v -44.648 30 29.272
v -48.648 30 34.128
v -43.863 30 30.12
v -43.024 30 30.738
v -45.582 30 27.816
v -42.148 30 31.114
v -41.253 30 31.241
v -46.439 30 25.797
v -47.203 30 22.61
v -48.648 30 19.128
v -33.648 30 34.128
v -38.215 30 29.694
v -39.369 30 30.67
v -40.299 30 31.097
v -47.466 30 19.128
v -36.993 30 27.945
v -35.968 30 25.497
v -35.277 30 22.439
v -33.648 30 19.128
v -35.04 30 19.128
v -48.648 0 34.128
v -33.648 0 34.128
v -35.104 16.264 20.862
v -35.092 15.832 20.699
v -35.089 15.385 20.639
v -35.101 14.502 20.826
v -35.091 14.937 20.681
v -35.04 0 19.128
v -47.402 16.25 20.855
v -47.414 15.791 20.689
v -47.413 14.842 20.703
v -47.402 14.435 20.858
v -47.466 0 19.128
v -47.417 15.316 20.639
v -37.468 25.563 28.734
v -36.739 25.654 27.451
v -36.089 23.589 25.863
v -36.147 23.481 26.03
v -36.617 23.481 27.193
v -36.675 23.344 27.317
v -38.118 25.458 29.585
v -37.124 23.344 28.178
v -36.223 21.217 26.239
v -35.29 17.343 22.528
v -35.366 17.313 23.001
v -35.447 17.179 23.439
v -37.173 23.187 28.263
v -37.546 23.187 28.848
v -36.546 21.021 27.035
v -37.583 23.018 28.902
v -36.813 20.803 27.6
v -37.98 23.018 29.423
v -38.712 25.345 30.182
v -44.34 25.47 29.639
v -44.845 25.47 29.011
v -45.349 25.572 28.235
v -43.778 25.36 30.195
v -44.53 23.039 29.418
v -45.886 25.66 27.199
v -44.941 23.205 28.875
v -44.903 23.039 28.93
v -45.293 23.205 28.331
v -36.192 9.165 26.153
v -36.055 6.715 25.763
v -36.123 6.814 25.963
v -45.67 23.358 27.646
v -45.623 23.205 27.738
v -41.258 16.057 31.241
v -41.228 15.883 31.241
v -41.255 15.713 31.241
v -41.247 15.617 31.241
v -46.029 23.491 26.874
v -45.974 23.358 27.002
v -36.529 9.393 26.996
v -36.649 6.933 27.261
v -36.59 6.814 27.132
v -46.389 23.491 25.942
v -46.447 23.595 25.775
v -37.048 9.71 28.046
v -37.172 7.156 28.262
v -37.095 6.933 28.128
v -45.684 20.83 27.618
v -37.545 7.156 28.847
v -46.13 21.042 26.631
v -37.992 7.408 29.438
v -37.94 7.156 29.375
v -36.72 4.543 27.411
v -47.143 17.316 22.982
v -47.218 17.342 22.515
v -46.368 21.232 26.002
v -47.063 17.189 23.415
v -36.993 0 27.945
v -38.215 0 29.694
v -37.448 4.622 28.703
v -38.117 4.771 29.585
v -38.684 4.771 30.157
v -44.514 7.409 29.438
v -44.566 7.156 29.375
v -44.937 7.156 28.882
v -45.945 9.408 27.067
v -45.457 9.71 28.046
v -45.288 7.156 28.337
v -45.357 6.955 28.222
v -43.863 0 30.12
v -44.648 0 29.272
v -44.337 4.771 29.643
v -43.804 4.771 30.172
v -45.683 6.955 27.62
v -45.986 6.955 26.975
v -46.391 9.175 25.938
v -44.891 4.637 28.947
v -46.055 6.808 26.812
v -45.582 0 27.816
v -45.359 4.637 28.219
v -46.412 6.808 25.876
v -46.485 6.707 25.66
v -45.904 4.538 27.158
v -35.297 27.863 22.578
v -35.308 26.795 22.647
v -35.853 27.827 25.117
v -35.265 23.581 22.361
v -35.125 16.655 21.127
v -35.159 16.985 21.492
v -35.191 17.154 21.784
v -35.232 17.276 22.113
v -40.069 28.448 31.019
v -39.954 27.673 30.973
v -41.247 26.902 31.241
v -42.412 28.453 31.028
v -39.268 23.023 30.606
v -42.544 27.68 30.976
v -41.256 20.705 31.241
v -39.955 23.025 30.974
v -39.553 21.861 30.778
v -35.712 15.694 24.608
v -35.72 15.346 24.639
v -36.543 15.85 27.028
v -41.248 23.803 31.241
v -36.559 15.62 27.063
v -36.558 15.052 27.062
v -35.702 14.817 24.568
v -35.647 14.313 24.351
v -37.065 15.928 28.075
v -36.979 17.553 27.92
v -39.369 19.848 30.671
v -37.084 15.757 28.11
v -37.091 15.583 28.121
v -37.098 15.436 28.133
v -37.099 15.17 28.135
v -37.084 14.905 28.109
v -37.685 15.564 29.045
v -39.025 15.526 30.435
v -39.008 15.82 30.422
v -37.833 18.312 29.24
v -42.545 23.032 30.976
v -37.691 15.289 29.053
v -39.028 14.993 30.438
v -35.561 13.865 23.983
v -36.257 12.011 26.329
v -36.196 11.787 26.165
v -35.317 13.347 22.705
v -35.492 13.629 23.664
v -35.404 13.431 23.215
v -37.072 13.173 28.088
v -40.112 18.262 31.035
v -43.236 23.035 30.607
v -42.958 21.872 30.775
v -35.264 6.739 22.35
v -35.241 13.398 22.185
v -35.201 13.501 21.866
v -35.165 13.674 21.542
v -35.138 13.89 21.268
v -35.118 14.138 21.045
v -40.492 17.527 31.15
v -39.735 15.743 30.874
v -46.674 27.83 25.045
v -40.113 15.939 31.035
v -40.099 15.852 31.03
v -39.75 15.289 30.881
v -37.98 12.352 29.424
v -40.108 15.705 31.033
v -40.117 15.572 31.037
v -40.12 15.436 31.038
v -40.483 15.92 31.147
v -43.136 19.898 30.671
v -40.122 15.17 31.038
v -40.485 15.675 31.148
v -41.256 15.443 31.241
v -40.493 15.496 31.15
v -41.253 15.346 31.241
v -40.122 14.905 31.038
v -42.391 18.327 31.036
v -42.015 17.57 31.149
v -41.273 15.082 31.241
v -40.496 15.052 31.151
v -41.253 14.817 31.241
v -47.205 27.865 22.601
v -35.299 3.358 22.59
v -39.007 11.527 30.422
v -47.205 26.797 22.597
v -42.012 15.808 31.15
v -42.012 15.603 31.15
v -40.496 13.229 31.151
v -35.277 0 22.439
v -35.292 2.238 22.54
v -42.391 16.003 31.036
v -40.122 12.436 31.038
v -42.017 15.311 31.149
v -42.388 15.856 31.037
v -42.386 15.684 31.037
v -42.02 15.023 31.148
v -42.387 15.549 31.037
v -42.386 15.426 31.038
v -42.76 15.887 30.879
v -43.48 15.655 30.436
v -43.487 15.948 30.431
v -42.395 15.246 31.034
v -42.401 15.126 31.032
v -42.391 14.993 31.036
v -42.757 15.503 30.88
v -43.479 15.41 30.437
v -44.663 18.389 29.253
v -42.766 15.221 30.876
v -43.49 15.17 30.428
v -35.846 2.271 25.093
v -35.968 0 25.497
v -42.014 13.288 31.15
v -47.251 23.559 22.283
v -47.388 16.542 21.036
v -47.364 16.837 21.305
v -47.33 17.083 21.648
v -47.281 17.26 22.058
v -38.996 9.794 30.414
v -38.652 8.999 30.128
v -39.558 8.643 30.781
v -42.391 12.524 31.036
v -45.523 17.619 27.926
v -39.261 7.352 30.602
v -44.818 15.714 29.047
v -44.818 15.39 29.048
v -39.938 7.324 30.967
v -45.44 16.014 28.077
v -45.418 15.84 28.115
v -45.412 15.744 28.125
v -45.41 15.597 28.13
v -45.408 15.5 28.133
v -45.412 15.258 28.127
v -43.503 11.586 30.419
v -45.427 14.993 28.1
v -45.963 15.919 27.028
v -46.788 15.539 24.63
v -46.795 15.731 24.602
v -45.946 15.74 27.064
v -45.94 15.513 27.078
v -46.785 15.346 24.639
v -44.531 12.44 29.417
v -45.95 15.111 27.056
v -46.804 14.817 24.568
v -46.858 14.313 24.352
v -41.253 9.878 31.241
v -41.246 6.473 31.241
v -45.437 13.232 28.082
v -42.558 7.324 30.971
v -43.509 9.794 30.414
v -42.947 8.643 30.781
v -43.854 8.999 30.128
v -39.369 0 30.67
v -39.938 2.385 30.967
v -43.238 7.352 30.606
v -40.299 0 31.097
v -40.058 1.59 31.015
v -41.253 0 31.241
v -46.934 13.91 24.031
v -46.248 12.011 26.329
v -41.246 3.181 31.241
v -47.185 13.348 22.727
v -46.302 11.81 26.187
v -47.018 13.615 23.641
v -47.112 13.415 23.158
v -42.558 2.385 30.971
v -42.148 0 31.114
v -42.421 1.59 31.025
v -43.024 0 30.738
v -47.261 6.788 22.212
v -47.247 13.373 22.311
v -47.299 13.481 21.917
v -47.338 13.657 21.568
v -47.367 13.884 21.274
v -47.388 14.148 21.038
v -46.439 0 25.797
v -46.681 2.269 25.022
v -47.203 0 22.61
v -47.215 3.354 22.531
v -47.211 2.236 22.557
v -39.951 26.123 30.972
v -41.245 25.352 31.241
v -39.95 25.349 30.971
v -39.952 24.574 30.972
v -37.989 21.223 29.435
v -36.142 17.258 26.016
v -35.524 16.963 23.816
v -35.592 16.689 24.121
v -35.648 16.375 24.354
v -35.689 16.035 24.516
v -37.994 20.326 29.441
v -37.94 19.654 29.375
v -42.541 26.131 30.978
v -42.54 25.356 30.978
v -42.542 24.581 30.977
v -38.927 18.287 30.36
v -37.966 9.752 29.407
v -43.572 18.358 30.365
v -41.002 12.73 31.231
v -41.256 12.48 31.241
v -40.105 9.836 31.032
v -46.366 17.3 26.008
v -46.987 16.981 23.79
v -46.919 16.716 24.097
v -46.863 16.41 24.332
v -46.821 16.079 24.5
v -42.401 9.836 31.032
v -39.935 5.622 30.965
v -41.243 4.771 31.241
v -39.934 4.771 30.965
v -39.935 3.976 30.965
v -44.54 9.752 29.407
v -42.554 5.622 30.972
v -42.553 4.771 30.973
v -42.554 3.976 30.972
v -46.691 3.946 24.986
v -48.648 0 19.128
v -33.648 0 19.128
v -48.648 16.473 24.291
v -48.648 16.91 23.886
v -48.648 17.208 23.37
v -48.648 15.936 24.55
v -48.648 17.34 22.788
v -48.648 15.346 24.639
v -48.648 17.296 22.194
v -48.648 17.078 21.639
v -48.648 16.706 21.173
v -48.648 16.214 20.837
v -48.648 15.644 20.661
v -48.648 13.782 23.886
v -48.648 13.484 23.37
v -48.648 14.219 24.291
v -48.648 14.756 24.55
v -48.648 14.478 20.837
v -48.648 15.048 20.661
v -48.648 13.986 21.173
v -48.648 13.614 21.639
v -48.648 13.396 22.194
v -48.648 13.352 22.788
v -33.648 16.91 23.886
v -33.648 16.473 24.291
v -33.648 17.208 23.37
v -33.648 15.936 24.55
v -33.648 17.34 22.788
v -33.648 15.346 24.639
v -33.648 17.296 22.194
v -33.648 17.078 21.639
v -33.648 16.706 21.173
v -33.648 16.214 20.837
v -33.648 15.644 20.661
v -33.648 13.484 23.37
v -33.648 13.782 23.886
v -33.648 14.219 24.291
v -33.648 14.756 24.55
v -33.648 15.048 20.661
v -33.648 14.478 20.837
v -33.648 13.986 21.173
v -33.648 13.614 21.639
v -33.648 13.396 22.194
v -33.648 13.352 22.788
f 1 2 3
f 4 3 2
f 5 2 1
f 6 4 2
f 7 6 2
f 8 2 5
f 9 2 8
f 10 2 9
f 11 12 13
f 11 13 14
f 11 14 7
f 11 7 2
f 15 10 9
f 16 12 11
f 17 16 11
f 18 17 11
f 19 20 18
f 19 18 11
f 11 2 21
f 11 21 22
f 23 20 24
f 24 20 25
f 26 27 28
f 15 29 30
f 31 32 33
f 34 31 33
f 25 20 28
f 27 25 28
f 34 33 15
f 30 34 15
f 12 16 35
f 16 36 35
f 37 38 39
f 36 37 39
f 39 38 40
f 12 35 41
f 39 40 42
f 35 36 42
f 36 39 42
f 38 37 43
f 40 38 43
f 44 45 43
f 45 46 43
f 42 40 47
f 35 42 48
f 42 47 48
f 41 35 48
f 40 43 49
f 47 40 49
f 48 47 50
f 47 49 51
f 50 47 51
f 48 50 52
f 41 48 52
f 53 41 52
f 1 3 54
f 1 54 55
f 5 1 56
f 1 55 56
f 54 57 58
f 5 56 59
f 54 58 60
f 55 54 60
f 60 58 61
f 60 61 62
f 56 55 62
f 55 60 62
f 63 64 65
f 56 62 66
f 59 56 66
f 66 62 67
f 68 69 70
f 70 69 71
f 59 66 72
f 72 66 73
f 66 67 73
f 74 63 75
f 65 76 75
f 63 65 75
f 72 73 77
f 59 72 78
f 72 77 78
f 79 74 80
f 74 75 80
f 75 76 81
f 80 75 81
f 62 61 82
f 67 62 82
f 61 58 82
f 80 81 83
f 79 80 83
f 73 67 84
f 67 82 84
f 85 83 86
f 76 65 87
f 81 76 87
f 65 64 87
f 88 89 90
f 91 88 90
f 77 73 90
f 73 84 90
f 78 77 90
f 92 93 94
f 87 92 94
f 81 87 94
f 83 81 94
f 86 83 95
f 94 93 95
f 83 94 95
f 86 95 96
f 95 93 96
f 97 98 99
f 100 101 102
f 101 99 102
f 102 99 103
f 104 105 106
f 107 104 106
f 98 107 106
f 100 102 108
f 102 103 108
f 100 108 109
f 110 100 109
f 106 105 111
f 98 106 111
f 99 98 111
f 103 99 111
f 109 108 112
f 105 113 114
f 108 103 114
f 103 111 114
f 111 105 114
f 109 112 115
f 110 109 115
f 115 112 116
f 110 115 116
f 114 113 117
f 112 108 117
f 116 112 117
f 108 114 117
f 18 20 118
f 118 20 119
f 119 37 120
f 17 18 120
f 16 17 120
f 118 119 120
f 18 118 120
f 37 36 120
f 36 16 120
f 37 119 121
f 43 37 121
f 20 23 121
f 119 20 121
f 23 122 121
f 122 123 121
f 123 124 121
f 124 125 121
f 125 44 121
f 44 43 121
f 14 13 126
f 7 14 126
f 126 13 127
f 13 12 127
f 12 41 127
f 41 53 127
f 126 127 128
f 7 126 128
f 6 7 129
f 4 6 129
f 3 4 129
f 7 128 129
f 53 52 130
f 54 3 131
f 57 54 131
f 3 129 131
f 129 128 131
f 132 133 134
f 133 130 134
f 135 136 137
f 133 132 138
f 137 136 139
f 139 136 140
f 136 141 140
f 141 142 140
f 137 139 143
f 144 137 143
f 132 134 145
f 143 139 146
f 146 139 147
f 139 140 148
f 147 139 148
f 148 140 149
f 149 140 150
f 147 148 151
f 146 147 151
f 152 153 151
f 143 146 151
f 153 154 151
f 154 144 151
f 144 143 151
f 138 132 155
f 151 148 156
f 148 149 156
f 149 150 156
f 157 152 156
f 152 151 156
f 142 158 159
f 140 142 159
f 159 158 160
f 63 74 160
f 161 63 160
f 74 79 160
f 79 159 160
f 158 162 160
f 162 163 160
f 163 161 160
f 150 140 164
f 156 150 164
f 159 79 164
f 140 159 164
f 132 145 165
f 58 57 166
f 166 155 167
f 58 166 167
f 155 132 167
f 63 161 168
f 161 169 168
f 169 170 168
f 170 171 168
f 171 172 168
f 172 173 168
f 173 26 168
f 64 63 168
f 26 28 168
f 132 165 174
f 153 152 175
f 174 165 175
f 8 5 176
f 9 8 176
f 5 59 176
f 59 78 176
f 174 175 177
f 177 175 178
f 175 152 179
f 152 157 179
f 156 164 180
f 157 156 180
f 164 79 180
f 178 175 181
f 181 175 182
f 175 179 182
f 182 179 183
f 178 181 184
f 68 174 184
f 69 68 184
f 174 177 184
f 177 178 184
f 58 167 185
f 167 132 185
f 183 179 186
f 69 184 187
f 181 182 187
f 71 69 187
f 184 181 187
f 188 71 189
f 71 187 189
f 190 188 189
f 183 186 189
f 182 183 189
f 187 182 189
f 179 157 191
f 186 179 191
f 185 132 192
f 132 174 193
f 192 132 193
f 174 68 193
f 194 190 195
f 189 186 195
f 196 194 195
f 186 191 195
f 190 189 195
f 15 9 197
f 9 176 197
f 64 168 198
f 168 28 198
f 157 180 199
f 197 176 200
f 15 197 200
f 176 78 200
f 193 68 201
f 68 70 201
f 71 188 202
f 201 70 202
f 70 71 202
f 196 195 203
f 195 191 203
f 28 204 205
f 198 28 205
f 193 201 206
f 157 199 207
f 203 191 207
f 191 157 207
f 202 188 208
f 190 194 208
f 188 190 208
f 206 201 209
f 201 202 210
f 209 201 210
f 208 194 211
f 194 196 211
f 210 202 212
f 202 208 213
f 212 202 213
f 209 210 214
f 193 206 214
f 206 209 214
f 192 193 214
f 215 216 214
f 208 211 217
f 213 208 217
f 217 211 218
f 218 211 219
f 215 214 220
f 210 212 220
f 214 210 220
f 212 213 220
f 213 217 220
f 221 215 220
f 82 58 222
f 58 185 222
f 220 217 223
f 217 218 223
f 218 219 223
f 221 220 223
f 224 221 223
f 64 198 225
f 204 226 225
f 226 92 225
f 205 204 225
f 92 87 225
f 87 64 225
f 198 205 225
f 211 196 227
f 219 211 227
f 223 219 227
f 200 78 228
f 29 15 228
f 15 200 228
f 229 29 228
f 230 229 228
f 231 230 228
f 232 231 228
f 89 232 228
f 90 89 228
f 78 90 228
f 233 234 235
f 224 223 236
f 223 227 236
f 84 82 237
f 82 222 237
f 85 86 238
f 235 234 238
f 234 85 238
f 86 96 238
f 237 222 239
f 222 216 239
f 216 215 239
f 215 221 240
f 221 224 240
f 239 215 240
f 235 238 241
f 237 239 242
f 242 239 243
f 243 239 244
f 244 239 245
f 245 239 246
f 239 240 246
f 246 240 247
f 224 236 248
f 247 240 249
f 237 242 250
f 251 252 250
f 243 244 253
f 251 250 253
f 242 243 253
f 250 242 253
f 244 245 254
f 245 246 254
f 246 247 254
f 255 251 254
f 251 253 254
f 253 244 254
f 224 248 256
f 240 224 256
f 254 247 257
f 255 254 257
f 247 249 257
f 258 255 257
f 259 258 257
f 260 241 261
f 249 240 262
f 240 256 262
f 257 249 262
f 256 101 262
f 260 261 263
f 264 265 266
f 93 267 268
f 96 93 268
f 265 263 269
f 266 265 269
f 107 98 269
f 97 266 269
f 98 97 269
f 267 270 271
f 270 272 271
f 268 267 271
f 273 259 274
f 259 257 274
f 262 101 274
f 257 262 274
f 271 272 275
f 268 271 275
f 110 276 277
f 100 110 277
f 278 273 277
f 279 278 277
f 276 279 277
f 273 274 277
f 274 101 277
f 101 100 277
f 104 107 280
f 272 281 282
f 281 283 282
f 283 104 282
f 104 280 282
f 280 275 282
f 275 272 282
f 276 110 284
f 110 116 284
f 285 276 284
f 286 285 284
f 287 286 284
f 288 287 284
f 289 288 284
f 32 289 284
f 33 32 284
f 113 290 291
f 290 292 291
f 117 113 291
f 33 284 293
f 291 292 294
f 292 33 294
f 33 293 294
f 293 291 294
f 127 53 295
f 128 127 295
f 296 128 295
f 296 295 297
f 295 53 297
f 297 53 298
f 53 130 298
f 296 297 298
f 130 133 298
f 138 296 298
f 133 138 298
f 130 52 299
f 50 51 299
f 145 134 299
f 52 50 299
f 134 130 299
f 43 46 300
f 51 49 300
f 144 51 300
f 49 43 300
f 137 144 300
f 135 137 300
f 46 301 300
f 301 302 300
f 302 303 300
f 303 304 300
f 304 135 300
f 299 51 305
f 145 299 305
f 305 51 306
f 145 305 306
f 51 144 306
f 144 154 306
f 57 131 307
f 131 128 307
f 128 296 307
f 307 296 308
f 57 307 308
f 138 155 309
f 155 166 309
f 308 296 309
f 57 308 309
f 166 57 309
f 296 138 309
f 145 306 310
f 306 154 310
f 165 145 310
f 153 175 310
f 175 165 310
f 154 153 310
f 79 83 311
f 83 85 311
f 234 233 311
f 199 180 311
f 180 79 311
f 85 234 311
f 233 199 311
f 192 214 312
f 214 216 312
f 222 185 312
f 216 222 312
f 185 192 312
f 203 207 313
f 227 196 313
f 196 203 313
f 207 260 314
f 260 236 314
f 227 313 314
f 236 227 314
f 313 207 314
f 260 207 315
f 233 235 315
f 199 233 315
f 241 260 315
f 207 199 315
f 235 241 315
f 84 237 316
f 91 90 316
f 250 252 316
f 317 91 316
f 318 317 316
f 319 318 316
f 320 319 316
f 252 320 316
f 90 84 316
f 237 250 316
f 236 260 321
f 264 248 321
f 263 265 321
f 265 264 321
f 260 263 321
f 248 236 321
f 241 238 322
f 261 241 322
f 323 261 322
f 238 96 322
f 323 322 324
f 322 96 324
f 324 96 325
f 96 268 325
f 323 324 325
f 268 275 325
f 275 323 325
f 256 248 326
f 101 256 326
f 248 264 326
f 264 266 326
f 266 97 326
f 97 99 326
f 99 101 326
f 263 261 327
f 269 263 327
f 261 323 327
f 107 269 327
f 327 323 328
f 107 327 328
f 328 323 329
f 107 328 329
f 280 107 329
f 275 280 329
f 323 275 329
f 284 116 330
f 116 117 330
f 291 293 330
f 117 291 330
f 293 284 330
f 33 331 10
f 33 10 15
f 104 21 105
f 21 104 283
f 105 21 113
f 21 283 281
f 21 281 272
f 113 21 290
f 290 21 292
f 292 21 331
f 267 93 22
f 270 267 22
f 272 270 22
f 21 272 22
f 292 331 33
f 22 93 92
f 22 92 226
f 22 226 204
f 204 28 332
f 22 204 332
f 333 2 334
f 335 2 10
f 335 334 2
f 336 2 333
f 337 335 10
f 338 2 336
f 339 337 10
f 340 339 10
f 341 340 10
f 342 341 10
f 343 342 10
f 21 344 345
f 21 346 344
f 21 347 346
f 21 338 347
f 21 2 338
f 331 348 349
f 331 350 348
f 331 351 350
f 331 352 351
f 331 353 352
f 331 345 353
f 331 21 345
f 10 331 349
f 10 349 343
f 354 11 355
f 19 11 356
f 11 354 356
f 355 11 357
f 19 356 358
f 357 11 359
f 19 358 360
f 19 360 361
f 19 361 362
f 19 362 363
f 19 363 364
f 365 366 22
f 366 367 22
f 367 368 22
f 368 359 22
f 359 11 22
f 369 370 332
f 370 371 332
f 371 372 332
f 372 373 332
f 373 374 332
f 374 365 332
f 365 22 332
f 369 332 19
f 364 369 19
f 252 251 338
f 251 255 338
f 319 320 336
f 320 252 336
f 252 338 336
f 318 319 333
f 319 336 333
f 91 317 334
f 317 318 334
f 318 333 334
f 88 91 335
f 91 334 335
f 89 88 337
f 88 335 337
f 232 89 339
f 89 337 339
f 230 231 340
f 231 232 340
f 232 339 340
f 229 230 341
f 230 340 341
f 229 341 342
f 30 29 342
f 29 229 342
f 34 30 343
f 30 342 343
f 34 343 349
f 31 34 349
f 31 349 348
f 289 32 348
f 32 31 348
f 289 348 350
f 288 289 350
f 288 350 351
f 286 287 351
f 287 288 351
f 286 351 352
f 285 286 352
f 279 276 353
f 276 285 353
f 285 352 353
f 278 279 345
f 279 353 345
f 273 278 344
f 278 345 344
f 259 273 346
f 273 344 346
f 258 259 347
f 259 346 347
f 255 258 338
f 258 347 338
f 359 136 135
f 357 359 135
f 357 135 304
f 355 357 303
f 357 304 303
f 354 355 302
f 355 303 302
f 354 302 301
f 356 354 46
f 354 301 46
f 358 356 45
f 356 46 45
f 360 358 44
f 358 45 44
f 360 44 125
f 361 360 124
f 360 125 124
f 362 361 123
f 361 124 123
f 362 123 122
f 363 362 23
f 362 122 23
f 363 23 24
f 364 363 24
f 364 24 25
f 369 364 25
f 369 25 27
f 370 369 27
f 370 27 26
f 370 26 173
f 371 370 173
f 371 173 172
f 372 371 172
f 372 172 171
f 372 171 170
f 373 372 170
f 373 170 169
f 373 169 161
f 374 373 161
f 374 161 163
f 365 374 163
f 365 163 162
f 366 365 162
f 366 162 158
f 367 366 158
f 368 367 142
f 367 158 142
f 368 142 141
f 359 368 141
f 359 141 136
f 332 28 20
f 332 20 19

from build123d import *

# Parameters (mm, degrees)
SKETCH1_W           = 15
SKETCH1_H           = 15
BOSS_EXTRUDE1_DEPTH = 30
SKETCH2_RX          = 12.112533461
SKETCH2_RY          = 6.212800173
CUT_EXTRUDE3_DEPTH  = 30
SKETCH3_R           = 2
CUT_EXTRUDE4_DEPTH  = 30


with BuildPart() as part:
    # Sketch1 → Boss-Extrude1 (new body)
    with BuildSketch(Plane(origin=(0, 0, 0), x_dir=(1, 0, 0), z_dir=(0, 1, 0))):
        with Locations((-41.148219583, -26.628215269)):
            Rectangle(SKETCH1_W, SKETCH1_H)
    extrude(amount=BOSS_EXTRUDE1_DEPTH)

    # Sketch2 → Cut-Extrude3 (cut)
    with BuildSketch(Plane(origin=(0, 0, 0), x_dir=(-1, 0, 0), z_dir=(0, -1, 0))):
        with Locations(Location((41.252812179, -19.128215269), (0, 0, -90))):
            Ellipse(SKETCH2_RX, SKETCH2_RY)
    extrude(amount=-CUT_EXTRUDE3_DEPTH, mode=Mode.SUBTRACT)

    # Sketch3 → Cut-Extrude4 (cut)
    with BuildSketch(Plane.ZY.offset(48.648219583)):
        with Locations((22.639015202, 15.346006291)):
            Circle(SKETCH3_R)
    extrude(amount=-CUT_EXTRUDE4_DEPTH, mode=Mode.SUBTRACT)


solid = part.part
